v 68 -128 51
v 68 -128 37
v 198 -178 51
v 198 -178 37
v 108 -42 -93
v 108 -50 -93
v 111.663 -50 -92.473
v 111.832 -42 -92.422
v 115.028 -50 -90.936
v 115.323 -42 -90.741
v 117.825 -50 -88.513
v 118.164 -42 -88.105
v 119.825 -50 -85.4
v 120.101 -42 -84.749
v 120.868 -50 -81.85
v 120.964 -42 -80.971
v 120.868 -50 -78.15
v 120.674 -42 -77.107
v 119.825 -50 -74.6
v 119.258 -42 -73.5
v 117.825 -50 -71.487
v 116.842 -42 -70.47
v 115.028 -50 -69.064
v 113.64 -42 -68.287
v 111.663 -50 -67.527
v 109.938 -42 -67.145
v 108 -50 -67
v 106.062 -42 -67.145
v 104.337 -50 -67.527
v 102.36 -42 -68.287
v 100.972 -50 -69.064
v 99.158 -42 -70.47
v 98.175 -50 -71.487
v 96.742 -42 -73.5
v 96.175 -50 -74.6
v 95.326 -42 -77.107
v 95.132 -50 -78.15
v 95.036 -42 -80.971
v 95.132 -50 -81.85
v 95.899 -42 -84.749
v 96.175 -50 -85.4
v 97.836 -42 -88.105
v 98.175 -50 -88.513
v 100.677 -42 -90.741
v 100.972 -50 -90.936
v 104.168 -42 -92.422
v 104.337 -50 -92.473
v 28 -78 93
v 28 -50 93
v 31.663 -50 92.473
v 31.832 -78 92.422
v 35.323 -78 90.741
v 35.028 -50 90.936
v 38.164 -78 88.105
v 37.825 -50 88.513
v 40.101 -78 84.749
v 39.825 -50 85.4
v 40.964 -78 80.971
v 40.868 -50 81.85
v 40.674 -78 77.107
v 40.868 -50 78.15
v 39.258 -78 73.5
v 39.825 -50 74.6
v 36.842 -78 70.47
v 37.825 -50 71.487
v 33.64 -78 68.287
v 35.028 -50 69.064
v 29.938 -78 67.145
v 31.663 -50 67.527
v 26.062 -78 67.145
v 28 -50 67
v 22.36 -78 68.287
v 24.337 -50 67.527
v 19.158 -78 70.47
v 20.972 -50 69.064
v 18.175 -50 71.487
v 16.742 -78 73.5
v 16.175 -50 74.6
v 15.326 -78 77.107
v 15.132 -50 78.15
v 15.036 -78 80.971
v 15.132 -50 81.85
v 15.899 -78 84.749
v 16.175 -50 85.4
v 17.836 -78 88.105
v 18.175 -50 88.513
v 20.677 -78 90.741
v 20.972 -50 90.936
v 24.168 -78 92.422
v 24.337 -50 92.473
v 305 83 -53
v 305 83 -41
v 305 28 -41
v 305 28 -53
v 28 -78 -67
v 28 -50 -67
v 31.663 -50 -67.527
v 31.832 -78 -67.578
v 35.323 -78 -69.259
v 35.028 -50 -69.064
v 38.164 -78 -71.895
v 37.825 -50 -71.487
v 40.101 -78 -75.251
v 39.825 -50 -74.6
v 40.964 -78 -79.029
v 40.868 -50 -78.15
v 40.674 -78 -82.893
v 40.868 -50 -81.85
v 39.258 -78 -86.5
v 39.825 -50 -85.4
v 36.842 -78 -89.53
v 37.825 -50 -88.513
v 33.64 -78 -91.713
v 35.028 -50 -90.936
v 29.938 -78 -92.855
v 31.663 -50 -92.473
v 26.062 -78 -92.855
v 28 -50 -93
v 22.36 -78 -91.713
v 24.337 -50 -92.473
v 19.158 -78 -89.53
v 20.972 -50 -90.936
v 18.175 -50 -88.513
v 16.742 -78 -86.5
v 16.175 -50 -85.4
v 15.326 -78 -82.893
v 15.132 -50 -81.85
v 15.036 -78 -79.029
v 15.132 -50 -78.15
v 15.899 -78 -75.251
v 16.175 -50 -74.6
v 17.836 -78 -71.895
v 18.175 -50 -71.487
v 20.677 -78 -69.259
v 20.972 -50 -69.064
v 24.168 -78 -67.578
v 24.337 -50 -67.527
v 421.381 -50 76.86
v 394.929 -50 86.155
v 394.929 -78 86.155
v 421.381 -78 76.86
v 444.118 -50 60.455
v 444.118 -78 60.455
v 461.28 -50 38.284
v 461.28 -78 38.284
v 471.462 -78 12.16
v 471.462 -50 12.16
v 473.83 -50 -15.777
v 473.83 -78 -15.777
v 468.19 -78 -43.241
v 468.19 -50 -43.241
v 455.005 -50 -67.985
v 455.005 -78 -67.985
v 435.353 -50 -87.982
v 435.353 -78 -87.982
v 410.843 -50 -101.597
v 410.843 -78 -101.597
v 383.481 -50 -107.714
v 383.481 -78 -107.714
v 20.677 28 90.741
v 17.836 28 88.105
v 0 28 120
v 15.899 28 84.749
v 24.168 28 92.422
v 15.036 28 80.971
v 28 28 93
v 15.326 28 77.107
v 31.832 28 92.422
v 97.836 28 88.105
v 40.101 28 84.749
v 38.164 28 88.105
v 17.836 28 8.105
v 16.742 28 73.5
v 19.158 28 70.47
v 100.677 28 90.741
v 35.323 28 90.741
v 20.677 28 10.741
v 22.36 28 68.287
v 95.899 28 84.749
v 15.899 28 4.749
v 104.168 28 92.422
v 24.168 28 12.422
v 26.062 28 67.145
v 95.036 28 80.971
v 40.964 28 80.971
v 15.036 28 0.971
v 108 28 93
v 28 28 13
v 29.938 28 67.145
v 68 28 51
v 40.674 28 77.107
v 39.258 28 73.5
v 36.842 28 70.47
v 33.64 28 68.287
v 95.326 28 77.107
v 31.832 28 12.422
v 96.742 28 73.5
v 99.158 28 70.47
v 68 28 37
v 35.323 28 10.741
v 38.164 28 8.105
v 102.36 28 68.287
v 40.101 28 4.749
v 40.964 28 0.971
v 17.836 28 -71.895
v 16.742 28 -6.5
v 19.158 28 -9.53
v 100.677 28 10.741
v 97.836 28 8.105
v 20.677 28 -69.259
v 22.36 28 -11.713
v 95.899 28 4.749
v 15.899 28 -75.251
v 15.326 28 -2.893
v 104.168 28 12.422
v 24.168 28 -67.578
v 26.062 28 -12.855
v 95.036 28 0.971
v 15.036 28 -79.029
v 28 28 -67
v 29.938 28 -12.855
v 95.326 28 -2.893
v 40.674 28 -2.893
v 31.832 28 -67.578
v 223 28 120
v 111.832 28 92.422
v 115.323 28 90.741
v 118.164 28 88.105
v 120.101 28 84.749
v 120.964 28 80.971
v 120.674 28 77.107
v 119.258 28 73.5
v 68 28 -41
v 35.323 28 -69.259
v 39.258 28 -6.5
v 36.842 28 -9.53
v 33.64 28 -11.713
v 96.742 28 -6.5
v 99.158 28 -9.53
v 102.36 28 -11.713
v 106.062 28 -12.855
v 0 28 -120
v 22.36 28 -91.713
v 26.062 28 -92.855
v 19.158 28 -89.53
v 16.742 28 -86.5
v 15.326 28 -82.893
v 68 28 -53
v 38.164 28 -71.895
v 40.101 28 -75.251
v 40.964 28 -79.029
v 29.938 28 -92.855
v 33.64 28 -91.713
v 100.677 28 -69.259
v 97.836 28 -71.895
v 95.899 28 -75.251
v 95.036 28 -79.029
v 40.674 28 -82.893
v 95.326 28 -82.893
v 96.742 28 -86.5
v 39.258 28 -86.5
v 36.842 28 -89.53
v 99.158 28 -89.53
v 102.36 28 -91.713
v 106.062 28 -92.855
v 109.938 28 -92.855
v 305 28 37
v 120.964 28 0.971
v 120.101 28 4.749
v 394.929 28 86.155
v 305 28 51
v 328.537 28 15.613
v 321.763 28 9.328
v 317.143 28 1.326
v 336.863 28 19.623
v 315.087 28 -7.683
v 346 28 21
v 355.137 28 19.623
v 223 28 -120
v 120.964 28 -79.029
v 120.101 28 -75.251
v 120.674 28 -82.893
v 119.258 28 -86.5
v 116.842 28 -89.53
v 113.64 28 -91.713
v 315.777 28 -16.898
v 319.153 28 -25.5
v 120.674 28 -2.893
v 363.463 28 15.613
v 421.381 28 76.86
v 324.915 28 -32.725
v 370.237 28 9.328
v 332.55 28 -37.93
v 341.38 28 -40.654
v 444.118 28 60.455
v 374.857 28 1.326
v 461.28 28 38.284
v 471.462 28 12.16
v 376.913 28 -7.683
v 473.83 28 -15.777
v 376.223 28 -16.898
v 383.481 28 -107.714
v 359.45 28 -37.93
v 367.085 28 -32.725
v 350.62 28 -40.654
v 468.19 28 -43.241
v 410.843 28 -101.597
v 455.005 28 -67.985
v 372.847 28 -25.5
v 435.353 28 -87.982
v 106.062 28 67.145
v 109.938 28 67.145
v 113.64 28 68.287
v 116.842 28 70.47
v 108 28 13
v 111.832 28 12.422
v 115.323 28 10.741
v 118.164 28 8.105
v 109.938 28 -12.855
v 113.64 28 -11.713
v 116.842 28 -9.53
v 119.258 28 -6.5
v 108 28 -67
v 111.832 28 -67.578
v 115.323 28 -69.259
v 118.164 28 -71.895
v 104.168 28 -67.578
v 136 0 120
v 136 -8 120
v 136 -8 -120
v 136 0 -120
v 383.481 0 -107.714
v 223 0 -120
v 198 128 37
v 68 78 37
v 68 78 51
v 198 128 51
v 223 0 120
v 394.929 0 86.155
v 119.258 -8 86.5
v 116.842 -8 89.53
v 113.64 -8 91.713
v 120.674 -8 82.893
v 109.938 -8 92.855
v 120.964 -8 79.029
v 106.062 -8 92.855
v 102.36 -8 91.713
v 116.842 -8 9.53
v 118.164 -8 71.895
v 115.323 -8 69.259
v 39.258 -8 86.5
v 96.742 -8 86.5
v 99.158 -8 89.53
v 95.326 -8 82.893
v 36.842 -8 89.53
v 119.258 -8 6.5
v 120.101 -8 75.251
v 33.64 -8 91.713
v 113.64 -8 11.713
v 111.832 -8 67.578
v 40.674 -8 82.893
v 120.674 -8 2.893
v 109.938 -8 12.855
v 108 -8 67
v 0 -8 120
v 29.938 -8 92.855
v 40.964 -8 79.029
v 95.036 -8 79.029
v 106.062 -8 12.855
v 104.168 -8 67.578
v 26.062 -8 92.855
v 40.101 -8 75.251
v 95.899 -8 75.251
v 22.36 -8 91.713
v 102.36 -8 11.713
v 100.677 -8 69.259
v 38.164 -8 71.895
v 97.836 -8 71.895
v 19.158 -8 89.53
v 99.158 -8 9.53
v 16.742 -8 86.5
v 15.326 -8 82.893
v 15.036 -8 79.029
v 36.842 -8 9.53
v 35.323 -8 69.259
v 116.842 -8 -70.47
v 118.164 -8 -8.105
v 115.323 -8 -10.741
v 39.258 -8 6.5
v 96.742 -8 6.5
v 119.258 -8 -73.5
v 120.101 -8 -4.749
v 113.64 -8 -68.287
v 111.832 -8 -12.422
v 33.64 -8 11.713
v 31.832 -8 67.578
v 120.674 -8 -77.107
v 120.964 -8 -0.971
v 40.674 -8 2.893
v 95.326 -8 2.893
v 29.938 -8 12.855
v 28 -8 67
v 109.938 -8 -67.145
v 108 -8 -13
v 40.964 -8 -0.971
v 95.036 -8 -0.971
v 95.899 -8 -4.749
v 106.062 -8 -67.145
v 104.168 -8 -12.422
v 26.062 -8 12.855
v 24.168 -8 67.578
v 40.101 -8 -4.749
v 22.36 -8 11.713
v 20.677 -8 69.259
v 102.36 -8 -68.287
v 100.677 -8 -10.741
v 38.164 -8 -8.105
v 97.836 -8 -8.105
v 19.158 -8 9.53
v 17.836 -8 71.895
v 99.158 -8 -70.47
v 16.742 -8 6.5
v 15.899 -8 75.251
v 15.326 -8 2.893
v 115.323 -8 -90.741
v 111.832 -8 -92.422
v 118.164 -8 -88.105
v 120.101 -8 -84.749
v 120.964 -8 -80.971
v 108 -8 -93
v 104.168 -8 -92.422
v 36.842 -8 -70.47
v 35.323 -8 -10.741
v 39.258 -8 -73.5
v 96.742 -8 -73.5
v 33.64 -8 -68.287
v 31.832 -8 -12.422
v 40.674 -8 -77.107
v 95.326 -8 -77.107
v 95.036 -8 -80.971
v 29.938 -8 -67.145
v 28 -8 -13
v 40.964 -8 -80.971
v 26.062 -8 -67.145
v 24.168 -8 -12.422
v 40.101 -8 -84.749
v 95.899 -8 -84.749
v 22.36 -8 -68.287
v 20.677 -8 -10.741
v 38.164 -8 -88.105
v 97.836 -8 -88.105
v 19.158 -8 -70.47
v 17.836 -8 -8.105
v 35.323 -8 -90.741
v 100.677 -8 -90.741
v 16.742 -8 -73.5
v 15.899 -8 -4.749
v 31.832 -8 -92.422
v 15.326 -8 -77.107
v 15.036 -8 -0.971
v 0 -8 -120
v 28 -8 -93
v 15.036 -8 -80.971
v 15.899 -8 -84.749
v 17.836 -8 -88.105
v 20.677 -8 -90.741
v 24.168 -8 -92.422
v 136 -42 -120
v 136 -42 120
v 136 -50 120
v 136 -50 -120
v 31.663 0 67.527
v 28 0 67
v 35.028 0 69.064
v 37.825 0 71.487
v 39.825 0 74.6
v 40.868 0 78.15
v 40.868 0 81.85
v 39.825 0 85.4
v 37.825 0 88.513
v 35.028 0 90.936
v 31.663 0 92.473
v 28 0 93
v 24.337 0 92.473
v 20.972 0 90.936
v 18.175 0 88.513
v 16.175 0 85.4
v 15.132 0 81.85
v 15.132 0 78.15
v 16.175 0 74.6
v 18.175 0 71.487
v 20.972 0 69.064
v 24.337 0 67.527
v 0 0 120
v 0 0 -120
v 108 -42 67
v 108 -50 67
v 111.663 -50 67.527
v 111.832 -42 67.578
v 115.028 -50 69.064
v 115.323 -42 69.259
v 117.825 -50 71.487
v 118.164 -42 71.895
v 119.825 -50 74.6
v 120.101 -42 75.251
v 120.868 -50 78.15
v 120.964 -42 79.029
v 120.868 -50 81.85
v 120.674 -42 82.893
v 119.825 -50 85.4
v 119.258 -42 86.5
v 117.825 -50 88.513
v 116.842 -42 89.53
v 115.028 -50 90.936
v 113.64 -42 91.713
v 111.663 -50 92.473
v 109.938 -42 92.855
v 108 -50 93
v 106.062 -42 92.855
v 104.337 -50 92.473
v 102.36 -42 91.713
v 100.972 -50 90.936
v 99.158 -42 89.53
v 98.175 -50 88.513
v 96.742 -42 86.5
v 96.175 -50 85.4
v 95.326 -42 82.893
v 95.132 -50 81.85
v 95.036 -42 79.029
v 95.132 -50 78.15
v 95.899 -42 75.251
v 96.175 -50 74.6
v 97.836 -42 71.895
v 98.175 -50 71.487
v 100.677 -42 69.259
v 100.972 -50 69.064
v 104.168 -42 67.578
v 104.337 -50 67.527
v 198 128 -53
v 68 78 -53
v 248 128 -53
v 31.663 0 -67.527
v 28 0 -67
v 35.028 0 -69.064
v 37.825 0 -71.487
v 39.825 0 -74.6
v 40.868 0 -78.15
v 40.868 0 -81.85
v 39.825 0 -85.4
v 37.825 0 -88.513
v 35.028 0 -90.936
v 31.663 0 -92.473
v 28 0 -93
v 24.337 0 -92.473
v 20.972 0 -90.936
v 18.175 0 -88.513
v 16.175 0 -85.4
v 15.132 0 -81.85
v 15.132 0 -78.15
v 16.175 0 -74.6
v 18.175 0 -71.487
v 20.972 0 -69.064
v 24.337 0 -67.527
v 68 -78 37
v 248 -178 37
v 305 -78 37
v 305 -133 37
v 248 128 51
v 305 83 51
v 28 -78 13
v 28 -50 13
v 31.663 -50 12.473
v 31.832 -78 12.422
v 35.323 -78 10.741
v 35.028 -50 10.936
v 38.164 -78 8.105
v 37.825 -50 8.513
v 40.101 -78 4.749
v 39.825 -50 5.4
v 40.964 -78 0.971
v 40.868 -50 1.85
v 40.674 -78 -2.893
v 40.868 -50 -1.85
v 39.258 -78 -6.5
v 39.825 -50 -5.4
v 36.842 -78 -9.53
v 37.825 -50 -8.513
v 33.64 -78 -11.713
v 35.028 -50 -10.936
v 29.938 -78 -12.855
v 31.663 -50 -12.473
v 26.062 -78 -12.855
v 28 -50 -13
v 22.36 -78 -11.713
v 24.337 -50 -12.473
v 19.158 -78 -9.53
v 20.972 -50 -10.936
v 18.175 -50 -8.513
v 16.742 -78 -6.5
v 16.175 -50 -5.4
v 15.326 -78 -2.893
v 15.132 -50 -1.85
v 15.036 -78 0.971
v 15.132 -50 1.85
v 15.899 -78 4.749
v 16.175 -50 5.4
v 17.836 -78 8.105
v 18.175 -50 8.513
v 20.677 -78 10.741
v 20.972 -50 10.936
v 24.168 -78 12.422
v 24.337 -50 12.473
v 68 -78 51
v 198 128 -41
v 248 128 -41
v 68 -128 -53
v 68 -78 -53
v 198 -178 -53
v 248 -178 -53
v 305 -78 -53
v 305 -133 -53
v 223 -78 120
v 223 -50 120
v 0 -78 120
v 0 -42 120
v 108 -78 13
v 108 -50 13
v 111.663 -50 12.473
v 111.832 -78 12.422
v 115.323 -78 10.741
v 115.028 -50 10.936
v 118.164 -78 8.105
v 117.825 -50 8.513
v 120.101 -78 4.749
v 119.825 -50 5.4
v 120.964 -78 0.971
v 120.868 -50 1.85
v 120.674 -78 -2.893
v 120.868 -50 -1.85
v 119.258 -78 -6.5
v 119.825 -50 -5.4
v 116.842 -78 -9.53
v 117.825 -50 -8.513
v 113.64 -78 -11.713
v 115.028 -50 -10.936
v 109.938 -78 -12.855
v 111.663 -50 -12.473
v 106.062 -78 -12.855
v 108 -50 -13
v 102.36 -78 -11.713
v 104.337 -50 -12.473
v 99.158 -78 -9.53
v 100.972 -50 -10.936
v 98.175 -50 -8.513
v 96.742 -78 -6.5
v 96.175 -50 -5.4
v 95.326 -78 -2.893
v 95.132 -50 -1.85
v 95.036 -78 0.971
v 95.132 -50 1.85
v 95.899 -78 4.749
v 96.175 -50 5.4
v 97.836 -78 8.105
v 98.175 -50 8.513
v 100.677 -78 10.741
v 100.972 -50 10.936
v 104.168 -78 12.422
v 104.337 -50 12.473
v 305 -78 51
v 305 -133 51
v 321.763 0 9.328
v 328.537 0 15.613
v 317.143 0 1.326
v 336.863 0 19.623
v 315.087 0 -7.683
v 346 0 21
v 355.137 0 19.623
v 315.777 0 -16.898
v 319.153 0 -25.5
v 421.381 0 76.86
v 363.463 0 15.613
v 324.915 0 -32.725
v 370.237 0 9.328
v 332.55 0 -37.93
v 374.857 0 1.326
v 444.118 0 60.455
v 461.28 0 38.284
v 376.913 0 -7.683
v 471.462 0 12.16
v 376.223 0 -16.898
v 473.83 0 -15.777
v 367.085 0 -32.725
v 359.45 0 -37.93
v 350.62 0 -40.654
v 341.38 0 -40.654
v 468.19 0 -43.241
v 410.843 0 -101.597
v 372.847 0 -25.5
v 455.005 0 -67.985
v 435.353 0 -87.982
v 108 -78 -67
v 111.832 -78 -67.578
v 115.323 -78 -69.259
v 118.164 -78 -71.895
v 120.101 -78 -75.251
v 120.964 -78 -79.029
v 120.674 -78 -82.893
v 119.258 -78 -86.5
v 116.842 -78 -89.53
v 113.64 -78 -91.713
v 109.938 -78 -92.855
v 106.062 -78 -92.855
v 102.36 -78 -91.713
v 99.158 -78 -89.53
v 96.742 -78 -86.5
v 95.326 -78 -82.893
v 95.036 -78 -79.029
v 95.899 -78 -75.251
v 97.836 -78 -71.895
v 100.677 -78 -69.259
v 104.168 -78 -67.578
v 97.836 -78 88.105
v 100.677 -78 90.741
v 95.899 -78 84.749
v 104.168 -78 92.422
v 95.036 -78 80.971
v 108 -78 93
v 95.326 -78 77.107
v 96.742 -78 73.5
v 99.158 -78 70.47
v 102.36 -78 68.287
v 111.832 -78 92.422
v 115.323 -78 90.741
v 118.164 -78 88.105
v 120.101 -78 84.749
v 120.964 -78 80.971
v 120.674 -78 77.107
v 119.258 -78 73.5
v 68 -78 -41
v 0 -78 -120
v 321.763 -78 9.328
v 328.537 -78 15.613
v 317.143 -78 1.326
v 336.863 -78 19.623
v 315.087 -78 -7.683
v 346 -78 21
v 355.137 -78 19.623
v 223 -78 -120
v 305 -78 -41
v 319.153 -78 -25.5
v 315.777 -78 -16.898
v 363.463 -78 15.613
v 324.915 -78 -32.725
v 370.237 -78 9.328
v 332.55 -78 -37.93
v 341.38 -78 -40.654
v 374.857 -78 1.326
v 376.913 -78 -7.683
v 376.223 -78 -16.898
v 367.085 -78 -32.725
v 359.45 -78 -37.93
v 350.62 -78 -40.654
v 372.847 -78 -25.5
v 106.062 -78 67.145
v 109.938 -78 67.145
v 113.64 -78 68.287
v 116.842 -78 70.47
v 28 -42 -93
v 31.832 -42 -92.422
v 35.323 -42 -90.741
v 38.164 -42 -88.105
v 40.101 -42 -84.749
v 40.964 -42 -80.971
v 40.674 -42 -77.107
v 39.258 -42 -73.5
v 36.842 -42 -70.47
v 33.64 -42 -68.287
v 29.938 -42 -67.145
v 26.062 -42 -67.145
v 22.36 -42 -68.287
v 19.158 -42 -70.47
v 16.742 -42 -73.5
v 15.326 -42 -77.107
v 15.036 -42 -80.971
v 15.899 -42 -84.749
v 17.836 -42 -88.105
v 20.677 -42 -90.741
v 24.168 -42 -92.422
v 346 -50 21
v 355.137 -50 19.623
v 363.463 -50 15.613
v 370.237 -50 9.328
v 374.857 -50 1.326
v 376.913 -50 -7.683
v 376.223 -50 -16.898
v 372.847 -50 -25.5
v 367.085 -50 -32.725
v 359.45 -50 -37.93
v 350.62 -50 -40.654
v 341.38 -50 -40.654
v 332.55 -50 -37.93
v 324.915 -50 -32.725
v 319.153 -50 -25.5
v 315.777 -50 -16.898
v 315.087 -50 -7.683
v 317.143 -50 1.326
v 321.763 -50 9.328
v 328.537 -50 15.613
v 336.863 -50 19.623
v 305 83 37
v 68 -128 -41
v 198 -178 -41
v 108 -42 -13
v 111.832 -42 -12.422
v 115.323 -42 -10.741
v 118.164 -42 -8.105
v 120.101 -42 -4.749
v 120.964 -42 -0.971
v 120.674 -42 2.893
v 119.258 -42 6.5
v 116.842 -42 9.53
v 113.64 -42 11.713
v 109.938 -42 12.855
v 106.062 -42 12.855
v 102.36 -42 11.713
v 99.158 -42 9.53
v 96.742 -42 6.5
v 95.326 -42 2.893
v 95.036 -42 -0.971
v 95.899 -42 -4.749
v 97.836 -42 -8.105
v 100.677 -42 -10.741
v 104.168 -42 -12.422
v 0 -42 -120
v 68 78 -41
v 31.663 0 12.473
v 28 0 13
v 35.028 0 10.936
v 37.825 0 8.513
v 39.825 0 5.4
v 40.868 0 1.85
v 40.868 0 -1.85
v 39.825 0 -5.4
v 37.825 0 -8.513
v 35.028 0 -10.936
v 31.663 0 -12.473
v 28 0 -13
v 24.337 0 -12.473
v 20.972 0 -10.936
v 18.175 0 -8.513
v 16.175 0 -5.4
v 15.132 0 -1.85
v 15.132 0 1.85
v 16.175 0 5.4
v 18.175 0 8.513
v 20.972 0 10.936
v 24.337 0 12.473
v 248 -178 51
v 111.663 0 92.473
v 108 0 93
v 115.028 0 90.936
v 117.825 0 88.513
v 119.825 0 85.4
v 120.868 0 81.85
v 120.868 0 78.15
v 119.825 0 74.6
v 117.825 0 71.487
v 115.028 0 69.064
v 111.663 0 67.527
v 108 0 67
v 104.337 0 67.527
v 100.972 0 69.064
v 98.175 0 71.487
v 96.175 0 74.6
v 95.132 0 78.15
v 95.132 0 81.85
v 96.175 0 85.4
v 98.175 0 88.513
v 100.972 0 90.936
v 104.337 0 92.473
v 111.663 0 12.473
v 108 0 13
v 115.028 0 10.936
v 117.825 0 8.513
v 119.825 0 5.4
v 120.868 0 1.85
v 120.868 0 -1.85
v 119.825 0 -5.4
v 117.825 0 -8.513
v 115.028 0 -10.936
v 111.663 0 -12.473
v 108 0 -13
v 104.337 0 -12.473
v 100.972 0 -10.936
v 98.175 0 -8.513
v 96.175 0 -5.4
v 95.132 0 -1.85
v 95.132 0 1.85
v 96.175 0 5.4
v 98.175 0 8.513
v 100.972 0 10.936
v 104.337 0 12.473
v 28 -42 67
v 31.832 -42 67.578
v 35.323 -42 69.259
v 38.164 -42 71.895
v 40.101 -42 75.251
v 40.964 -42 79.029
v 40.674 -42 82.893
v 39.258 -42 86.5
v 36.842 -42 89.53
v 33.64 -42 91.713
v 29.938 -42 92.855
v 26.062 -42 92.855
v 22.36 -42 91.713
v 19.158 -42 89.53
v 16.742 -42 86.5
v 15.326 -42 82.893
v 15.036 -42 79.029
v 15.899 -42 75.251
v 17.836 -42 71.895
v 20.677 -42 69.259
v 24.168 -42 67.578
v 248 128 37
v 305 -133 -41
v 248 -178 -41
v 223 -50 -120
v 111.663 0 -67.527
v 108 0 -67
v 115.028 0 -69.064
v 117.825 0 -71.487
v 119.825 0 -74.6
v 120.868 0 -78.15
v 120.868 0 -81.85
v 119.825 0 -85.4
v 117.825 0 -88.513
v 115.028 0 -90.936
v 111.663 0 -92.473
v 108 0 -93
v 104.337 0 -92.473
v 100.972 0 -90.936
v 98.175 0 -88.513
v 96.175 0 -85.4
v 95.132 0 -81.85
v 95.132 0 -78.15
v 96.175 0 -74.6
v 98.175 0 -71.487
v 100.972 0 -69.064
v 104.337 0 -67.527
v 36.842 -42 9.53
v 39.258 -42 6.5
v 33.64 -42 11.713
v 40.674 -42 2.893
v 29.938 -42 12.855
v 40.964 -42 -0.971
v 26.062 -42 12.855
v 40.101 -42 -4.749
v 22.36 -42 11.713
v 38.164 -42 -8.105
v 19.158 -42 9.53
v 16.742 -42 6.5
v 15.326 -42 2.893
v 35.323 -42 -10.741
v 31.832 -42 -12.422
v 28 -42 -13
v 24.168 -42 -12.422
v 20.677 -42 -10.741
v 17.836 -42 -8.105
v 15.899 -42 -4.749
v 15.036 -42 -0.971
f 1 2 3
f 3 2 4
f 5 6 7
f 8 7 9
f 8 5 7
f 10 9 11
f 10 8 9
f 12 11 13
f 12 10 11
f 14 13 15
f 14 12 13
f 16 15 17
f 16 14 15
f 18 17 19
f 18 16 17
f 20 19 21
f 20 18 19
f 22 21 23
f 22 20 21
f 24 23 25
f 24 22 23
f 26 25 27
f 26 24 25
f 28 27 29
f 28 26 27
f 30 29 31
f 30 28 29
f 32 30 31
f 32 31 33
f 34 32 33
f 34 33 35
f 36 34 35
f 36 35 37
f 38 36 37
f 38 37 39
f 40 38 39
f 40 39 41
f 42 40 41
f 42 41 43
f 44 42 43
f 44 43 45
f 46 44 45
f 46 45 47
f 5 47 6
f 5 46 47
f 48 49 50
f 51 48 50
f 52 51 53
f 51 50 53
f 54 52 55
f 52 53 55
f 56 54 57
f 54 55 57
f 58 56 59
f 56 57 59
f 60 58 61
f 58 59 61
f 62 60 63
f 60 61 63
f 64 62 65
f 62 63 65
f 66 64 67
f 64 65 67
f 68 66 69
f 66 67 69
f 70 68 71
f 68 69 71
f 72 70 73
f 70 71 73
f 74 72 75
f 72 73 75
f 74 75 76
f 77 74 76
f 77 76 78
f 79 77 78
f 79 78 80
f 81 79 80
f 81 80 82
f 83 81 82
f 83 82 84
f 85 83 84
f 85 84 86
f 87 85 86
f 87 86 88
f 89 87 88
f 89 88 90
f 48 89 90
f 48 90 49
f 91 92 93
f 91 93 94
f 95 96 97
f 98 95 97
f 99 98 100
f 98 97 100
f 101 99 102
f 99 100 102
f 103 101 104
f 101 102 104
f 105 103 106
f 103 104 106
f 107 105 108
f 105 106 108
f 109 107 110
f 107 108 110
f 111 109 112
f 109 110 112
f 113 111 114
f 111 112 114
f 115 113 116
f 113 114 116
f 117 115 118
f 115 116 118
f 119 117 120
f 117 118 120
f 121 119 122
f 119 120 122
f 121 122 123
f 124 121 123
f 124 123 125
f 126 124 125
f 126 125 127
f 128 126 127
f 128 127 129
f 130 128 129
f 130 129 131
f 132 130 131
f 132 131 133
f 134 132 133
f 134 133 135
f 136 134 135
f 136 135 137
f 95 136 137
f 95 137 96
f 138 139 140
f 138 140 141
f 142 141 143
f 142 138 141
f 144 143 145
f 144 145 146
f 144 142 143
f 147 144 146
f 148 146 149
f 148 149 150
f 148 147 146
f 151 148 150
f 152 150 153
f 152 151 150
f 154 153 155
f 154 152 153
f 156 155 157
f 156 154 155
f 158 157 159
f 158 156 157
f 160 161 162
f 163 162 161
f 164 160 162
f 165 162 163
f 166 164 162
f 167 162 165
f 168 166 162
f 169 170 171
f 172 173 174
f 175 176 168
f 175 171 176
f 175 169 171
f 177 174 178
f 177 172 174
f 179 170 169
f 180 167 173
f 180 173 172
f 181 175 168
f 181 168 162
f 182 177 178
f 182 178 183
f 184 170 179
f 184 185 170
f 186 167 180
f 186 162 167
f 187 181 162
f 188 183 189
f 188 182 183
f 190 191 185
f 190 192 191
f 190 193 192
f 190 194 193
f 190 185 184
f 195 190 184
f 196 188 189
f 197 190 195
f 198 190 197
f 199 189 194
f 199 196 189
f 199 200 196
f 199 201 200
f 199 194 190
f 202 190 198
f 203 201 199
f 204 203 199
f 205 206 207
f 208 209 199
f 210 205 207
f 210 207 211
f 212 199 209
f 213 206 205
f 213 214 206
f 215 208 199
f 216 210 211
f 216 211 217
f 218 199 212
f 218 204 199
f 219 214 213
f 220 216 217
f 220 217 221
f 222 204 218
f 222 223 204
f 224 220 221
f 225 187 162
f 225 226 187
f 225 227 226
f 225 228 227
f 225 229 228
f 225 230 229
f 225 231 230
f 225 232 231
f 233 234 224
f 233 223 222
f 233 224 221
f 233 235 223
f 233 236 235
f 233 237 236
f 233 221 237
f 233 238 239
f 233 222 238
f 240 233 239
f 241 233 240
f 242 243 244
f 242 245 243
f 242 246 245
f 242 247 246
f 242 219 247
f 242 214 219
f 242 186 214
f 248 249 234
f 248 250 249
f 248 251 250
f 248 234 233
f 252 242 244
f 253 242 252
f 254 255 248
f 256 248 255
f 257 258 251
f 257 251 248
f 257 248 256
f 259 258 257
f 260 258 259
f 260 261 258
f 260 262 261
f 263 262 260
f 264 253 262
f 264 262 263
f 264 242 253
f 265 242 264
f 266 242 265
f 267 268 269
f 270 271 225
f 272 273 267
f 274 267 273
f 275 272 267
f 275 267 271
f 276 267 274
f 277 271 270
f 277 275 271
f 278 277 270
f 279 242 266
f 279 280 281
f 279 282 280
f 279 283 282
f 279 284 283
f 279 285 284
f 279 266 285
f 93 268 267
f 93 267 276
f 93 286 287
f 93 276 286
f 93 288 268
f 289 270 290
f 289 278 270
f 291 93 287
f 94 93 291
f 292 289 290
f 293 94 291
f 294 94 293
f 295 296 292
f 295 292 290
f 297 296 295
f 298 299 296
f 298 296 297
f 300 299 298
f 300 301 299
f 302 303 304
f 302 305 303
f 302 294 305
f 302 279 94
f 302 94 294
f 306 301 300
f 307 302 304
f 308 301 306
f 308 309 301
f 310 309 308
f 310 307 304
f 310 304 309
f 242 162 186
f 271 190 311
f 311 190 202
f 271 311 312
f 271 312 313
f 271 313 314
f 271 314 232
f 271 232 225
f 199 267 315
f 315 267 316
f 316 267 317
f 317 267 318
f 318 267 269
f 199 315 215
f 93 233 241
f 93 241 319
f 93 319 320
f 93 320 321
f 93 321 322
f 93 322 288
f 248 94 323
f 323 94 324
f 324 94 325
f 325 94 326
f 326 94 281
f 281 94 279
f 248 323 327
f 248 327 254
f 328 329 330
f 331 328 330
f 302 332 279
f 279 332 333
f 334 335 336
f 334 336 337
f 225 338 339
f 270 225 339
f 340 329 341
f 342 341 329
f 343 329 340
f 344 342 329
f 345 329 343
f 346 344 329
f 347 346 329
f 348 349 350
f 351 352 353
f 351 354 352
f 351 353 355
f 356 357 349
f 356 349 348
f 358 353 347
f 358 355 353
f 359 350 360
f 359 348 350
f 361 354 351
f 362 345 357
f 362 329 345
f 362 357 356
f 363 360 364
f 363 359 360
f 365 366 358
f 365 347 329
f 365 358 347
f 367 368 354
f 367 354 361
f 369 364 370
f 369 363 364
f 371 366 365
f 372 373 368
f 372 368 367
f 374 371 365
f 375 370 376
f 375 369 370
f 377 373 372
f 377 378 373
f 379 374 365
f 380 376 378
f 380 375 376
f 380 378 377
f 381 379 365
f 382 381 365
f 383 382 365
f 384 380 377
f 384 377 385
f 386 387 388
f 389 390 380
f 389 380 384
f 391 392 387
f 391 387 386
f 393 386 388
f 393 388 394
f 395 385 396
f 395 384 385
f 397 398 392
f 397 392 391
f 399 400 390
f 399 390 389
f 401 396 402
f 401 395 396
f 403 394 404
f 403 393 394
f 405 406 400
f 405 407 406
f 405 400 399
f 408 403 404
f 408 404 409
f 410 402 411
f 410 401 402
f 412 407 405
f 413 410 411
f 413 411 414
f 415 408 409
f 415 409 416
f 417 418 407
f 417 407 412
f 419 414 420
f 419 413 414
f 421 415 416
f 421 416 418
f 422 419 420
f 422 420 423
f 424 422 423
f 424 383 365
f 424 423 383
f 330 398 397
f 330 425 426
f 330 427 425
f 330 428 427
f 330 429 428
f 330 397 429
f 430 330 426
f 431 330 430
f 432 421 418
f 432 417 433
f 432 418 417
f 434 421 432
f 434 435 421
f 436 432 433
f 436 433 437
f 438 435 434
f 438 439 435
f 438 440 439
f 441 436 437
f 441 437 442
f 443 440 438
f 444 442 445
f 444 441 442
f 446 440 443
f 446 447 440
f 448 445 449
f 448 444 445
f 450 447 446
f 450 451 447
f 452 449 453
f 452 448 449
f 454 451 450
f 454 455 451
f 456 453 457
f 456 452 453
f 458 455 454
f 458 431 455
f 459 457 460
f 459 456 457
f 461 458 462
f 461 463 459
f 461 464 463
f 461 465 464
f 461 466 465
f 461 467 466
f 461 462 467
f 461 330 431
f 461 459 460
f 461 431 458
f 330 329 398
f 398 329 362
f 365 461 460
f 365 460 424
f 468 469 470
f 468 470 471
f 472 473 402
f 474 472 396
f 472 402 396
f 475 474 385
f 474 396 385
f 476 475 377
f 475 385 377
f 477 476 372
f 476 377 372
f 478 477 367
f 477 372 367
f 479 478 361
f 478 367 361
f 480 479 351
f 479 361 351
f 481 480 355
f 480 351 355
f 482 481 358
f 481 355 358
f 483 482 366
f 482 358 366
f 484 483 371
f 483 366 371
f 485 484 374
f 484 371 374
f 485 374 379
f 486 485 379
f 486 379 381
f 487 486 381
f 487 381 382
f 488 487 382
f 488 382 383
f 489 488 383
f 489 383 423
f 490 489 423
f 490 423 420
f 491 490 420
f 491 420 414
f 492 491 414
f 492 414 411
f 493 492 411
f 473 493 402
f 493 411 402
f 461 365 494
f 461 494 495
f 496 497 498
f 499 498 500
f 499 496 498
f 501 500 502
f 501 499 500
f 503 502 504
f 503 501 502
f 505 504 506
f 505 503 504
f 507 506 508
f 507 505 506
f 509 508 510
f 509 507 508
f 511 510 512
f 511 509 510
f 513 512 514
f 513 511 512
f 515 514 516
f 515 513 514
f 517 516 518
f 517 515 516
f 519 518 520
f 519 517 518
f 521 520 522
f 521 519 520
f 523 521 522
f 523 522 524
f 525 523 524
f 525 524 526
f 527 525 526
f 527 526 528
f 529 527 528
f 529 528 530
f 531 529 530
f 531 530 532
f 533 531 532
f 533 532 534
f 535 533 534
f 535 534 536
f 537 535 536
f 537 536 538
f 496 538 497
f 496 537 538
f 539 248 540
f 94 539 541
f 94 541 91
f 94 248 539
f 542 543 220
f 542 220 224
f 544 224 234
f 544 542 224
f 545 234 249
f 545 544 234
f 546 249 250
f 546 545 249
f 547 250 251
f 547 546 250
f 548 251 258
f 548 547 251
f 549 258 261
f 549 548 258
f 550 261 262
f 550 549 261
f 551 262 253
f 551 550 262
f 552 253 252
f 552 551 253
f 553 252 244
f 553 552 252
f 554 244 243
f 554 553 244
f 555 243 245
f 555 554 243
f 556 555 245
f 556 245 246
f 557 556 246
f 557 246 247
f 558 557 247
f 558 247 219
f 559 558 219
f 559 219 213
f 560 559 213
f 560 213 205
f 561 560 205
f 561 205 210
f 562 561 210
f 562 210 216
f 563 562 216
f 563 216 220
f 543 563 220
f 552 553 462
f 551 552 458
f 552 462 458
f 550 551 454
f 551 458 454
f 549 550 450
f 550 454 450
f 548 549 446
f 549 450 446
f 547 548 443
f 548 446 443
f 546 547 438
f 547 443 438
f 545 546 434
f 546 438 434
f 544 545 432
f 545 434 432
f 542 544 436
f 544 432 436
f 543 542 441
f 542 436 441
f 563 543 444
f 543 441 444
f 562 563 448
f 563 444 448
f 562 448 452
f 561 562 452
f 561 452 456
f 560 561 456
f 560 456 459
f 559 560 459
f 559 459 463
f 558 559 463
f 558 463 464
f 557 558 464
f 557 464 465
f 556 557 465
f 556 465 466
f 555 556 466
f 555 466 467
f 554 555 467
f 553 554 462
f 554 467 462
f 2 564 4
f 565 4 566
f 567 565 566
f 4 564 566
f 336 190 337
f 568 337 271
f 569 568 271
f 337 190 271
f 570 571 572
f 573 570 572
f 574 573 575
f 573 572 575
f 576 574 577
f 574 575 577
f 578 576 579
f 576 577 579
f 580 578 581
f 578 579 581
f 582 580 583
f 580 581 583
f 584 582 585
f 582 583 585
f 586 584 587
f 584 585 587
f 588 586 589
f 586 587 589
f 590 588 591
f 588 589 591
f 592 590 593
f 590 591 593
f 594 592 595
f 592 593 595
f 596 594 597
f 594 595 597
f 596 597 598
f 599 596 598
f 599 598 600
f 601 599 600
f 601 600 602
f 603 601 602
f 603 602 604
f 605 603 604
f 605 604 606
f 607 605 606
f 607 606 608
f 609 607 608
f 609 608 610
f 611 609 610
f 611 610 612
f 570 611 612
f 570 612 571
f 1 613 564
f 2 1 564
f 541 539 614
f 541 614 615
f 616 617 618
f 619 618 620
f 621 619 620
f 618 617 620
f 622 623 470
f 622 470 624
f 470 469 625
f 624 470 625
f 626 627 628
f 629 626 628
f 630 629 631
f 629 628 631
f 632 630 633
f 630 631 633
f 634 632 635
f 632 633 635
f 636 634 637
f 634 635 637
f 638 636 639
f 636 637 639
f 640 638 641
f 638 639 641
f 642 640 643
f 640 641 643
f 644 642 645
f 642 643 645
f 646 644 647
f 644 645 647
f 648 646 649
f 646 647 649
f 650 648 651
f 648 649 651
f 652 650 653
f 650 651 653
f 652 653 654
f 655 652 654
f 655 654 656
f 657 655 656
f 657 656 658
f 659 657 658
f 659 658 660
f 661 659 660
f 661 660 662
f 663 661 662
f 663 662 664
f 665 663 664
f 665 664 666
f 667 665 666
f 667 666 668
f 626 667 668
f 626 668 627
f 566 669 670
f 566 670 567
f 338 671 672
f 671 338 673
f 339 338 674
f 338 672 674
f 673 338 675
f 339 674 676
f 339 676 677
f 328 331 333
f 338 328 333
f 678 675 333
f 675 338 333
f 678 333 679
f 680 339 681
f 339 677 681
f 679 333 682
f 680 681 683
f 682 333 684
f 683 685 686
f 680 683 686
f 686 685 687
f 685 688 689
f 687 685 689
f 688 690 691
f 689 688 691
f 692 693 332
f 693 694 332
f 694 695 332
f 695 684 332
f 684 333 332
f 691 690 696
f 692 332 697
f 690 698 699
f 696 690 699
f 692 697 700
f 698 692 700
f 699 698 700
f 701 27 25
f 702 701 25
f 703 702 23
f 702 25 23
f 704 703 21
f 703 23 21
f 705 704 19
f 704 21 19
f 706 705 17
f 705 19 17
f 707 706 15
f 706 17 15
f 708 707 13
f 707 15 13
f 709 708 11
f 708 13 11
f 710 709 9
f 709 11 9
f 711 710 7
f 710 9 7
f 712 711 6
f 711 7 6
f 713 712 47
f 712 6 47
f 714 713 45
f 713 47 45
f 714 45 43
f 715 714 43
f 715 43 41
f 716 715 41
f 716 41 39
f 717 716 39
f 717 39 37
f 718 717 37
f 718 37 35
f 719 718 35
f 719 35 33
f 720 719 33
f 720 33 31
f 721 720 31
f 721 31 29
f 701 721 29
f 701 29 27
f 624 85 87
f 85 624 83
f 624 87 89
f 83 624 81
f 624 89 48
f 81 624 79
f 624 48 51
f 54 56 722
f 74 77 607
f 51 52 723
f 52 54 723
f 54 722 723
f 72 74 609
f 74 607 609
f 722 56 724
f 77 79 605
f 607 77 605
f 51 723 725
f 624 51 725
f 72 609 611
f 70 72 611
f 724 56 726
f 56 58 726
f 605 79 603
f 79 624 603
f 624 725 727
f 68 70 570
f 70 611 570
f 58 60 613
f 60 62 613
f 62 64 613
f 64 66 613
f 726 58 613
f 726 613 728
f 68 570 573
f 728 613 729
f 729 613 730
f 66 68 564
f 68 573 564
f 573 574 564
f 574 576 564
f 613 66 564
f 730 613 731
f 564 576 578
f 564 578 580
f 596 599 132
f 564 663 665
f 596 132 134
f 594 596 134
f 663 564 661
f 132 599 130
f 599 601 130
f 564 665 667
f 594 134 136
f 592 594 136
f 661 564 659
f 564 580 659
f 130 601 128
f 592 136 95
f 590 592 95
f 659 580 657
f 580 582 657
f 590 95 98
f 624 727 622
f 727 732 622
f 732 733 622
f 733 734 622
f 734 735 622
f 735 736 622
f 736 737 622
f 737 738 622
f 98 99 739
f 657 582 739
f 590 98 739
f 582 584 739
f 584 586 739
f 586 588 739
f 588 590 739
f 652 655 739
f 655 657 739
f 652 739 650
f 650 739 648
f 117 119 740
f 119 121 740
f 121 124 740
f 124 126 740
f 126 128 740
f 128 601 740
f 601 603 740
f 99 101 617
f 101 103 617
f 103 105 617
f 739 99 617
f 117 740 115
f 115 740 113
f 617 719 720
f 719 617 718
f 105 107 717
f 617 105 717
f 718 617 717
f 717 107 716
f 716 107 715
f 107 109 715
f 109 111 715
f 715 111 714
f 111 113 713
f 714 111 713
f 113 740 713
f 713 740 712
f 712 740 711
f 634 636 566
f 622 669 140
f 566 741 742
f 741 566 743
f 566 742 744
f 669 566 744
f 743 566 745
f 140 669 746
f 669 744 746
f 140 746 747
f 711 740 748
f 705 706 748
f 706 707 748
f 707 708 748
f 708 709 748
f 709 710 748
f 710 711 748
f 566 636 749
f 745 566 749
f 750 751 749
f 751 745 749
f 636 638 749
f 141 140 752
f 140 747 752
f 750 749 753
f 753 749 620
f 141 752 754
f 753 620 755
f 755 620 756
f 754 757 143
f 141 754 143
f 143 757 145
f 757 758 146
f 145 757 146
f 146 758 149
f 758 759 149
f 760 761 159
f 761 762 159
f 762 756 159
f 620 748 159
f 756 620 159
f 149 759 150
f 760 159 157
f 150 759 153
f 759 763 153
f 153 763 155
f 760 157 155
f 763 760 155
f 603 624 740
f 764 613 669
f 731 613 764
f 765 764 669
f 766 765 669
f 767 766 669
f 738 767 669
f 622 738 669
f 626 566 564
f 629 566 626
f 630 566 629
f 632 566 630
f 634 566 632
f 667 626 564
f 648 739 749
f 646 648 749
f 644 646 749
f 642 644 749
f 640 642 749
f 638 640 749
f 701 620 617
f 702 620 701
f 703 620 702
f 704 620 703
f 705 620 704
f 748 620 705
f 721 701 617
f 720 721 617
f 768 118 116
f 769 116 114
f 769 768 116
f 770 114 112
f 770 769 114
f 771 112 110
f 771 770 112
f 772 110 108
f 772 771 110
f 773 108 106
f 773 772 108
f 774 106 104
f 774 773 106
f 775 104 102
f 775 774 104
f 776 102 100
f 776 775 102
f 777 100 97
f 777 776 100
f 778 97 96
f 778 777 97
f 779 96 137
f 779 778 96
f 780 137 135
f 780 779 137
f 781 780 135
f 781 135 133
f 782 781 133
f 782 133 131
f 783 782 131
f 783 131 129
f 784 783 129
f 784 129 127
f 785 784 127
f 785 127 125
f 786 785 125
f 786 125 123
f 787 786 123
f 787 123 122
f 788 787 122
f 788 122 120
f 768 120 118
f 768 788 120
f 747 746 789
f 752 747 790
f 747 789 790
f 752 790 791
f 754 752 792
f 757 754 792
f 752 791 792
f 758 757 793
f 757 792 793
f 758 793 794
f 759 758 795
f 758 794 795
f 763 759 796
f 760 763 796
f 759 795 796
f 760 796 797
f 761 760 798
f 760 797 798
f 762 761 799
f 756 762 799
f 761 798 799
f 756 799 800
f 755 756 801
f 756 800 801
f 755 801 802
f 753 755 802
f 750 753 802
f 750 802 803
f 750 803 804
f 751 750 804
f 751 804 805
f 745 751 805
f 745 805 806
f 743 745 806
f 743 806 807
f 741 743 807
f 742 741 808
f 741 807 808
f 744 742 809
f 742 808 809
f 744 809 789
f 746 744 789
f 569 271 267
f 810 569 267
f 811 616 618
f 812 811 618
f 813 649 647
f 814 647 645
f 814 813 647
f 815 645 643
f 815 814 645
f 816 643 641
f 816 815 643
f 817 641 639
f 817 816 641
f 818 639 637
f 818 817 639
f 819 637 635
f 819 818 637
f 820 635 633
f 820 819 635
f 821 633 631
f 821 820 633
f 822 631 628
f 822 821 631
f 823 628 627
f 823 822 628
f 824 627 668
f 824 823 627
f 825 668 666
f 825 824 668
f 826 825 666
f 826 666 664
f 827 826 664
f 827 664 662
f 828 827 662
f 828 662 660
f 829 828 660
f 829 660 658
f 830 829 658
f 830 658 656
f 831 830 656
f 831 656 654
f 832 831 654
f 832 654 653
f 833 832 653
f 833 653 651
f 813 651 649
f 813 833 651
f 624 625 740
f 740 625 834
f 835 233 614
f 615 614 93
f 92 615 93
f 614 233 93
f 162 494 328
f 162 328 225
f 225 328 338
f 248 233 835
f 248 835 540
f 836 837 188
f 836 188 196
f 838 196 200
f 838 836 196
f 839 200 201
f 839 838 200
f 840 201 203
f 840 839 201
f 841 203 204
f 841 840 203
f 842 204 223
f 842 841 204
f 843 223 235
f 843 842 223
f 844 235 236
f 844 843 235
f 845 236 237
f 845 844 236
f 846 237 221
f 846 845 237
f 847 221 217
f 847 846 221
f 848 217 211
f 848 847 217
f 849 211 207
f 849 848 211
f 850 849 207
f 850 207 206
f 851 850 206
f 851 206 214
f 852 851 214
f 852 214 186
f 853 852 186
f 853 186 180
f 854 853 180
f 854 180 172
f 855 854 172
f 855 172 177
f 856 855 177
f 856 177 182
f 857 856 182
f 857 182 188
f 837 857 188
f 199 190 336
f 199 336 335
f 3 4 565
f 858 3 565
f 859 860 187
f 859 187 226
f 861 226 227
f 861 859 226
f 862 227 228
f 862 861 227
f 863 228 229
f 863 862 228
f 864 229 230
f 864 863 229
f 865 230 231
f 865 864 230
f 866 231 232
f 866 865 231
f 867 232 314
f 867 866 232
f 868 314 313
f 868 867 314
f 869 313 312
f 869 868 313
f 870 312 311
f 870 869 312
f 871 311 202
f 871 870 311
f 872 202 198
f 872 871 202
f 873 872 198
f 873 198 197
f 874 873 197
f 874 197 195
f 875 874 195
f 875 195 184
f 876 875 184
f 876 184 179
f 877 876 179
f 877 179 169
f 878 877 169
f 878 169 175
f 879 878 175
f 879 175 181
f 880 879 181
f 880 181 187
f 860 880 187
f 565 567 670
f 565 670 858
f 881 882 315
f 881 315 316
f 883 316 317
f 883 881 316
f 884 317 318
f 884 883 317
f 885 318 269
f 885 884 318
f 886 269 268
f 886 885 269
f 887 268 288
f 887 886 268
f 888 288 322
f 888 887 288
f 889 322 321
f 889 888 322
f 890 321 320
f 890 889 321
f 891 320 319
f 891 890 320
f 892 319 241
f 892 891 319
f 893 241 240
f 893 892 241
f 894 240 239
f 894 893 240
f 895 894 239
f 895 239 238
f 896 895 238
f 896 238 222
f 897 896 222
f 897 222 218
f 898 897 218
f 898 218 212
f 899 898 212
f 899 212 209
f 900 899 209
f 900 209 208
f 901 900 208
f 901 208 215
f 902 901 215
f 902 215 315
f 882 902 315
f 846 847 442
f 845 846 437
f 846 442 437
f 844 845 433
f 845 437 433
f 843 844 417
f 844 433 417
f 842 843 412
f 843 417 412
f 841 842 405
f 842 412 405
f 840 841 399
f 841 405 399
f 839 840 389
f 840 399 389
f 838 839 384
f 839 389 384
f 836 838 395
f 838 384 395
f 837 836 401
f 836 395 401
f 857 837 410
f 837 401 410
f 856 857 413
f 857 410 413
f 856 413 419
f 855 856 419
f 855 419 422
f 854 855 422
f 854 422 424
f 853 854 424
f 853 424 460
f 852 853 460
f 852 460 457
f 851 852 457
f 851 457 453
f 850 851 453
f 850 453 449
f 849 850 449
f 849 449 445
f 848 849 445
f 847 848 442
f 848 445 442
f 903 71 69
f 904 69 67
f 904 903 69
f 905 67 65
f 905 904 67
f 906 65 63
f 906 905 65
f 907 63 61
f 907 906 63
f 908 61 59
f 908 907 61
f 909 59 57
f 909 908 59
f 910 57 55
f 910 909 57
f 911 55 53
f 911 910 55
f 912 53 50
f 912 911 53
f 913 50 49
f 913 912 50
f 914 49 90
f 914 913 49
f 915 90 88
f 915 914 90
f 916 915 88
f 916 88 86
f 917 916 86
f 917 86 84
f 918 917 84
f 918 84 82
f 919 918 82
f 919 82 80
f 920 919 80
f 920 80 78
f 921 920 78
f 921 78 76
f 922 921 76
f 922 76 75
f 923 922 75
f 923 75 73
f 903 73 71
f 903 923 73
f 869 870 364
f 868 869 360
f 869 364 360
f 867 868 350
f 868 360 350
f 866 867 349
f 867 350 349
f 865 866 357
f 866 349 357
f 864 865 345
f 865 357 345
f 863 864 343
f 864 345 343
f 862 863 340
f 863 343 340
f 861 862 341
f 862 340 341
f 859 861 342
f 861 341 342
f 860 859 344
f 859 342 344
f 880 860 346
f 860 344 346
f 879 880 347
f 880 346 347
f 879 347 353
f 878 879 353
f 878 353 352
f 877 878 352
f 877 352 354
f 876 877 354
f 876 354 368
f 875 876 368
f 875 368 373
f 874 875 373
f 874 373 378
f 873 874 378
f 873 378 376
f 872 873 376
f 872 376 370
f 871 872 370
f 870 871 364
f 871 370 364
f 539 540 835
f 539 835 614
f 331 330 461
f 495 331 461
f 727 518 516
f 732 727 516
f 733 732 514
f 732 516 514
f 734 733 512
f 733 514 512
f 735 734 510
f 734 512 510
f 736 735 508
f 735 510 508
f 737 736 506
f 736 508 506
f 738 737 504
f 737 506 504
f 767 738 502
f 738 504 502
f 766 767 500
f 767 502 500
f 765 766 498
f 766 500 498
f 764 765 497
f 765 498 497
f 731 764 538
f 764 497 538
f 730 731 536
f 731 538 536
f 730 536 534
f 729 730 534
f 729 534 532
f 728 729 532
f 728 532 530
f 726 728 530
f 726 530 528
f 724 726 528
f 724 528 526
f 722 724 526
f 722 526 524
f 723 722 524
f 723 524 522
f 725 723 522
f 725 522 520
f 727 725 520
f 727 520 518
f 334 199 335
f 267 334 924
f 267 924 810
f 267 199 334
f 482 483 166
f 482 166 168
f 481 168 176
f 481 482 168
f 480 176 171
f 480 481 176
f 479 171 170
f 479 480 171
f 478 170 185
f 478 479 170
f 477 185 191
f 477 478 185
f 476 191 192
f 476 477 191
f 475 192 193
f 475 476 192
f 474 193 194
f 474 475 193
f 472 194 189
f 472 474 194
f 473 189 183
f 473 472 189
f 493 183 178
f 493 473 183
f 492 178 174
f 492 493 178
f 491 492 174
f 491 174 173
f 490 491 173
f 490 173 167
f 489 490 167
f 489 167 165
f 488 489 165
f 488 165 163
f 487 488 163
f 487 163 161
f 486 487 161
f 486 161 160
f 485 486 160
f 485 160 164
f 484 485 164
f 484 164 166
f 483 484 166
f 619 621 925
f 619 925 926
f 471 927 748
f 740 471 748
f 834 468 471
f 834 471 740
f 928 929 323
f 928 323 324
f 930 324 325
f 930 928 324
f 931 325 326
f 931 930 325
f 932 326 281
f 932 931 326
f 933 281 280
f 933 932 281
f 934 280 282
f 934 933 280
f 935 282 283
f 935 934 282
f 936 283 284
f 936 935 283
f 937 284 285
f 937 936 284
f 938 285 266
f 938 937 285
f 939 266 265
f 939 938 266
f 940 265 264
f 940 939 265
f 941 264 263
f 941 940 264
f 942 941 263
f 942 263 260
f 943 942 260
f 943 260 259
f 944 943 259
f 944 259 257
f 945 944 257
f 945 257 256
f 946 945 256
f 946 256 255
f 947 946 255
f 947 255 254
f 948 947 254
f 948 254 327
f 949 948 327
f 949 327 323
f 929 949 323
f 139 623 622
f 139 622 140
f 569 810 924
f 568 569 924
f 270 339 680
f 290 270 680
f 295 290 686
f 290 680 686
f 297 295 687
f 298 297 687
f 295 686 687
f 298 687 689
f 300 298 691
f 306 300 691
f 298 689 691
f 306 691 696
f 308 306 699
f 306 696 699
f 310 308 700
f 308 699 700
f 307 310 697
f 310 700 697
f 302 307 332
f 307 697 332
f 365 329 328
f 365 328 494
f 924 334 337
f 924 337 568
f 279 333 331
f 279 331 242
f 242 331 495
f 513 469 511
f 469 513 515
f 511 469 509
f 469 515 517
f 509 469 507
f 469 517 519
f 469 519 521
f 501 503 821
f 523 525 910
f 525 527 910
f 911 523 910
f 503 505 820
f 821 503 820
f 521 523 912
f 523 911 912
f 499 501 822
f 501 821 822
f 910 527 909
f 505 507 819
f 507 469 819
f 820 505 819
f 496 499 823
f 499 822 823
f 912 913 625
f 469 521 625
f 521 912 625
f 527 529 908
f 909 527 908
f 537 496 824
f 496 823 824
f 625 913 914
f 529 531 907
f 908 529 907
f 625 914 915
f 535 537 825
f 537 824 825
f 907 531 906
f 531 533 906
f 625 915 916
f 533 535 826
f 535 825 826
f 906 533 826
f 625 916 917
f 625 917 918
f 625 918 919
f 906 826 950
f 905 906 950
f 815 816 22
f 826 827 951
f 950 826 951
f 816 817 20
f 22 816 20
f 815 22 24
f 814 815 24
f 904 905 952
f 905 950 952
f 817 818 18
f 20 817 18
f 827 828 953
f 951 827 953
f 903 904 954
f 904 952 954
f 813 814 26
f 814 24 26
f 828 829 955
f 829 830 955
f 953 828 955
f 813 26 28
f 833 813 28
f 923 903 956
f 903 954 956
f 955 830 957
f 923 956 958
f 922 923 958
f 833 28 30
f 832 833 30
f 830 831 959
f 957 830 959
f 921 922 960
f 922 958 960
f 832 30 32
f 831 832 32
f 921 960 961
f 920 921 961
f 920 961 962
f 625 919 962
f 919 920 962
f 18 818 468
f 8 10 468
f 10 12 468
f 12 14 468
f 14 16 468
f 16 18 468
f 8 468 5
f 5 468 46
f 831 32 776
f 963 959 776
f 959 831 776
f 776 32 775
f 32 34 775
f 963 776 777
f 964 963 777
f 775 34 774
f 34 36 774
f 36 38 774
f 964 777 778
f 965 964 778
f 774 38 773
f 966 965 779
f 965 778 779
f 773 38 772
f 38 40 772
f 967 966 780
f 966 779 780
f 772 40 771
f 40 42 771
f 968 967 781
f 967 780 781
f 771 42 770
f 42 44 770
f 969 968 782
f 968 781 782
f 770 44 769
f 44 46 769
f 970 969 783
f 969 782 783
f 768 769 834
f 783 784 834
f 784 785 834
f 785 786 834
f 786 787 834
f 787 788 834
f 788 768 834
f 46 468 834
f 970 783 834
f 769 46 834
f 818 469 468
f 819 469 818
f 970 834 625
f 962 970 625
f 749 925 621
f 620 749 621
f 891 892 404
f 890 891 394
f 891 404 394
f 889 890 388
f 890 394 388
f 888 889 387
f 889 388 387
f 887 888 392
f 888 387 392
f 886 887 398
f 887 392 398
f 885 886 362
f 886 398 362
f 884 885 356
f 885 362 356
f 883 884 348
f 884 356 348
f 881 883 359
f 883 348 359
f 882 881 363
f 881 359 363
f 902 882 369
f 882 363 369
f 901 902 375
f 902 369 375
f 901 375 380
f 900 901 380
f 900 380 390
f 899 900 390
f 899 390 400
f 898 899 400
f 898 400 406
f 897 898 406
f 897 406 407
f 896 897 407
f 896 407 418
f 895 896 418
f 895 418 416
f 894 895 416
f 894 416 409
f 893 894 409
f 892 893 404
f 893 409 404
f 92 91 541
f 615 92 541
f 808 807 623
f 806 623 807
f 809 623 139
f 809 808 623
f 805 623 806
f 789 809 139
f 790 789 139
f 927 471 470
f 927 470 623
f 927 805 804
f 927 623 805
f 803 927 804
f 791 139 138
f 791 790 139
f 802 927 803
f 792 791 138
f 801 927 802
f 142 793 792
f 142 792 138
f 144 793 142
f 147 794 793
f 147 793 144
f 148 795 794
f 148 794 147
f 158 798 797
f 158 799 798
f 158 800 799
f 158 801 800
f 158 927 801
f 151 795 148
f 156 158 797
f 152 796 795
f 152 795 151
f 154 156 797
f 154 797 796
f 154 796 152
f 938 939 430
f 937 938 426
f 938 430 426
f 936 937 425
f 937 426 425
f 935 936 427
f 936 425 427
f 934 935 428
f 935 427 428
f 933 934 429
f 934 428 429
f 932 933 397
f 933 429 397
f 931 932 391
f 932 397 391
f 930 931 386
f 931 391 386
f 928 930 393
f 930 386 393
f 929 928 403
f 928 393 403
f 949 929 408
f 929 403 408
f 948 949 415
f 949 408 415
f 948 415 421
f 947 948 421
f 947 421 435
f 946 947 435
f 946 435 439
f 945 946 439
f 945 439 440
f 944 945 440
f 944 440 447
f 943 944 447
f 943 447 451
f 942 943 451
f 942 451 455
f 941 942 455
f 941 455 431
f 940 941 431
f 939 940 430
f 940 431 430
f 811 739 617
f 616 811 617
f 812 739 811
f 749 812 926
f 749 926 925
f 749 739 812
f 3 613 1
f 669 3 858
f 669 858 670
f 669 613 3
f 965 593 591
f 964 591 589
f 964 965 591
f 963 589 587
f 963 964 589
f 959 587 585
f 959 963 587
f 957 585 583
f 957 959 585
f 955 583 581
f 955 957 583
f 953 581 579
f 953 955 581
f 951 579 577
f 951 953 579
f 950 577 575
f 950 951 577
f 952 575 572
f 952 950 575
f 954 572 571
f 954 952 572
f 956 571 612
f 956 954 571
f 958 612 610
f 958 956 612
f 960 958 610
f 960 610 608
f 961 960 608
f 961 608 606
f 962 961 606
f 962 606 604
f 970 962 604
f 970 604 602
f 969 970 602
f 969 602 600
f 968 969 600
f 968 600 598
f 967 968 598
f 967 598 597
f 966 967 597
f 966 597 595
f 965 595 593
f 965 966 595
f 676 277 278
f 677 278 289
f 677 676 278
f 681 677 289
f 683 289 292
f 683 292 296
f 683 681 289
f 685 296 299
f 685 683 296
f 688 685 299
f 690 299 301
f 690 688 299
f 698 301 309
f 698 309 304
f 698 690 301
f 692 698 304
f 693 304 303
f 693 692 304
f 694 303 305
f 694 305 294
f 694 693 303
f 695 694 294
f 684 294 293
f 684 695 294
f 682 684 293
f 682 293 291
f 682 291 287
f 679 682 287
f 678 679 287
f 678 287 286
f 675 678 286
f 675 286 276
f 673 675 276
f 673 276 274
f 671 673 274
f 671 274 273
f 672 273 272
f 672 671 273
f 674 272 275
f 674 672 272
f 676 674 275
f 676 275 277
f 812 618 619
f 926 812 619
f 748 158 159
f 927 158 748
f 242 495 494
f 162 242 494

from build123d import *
from build123d.topology import SkipClean

# Parameters (mm, degrees)
SKETCH_1_R          = 31
SKETCH_1_R_2        = 13
EXTRUDE_1_DEPTH     = 28
SKETCH_2_W          = 237
SKETCH_2_H          = 12
SKETCH_2_H_2        = 14
EXTRUDE_2_DEPTH     = 100
CUT_EXTRUDE_1_DEPTH = 521.566038078
EXTRUDE_START       = 8
SKETCH_4_W          = 136
SKETCH_4_H          = 240
SKETCH_4_R          = 13
EXTRUDE_3_DEPTH     = 8


with BuildPart() as part:
    # 草图1 → 凸台-拉伸1 (new body)
    with BuildSketch(Plane(origin=(0, 0, 0), x_dir=(1, 0, 0), z_dir=(0, 1, 0))):
        with BuildLine():
            Line((0, 120), (0, -120))
            Line((0, -120), (223, -120))
            Line((223, -120), (394.928728095, -86.154579988))
            ThreePointArc((394.928728095, -86.154579988), (473.829584875, 15.776878329), (383.480702502, 107.714068025))
            Line((383.480702502, 107.714068025), (223, 120))
            Line((223, 120), (0, 120))
        make_face()
        with Locations(Location((346, 10, 0), (0, 0, 270))):
            Circle(SKETCH_1_R, mode=Mode.SUBTRACT)
        with Locations(Location((28, 80, 0), (0, 0, 270))):
            Circle(SKETCH_1_R_2, mode=Mode.SUBTRACT)
        with Locations(Location((28, 0, 0), (0, 0, 270))):
            Circle(SKETCH_1_R_2, mode=Mode.SUBTRACT)
        with Locations(Location((28, -80, 0), (0, 0, 270))):
            Circle(SKETCH_1_R_2, mode=Mode.SUBTRACT)
        with Locations(Location((108, 80, 0), (0, 0, 270))):
            Circle(SKETCH_1_R_2, mode=Mode.SUBTRACT)
        with Locations(Location((108, 0, 0), (0, 0, 270))):
            Circle(SKETCH_1_R_2, mode=Mode.SUBTRACT)
        with Locations(Location((108, -80, 0), (0, 0, 270))):
            Circle(SKETCH_1_R_2, mode=Mode.SUBTRACT)
    extrude(amount=EXTRUDE_1_DEPTH)

    # 草图2 → 凸台-拉伸2 (add)
    with BuildSketch(Plane(origin=(0, 28, 0), x_dir=(1, 0, 0), z_dir=(0, 1, 0))):
        with Locations((186.5, 47)):
            Rectangle(SKETCH_2_W, SKETCH_2_H)
        with Locations((186.5, -44)):
            Rectangle(SKETCH_2_W, SKETCH_2_H_2)
    extrude(amount=EXTRUDE_2_DEPTH)

    # 草图3 → 切除-拉伸1 (cut, through all)
    with BuildSketch(Plane(origin=(0, 0, -53), x_dir=(1, 0, 0), z_dir=(0, 0, -1))):
        Polygon((305, -128), (305, -83), (248, -128), align=None)
        Polygon((68, -128), (68, -78), (198, -128), align=None)
    extrude(amount=-CUT_EXTRUDE_1_DEPTH, mode=Mode.SUBTRACT)

    # 草图4 → 凸台-拉伸3 (add)
    with SkipClean():  # the faces are left unmerged after this step: merging them gives an invalid solid
        with BuildSketch(Plane(origin=(0, 0, 0), x_dir=(-1, 0, 0), z_dir=(0, -1, 0)).offset(EXTRUDE_START)):
            with Locations((-68, 0)):
                Rectangle(SKETCH_4_W, SKETCH_4_H)
            with Locations(Location((-28, -80, 0), (0, 0, 90))):
                Circle(SKETCH_4_R, mode=Mode.SUBTRACT)
            with Locations(Location((-108, -80, 0), (0, 0, 90))):
                Circle(SKETCH_4_R, mode=Mode.SUBTRACT)
            with Locations(Location((-28, 0, 0), (0, 0, 90))):
                Circle(SKETCH_4_R, mode=Mode.SUBTRACT)
            with Locations(Location((-108, 0, 0), (0, 0, 90))):
                Circle(SKETCH_4_R, mode=Mode.SUBTRACT)
            with Locations(Location((-28, 80, 0), (0, 0, 90))):
                Circle(SKETCH_4_R, mode=Mode.SUBTRACT)
            with Locations(Location((-108, 80, 0), (0, 0, 90))):
                Circle(SKETCH_4_R, mode=Mode.SUBTRACT)
        extrude(amount=-EXTRUDE_3_DEPTH)


with BuildPart() as body_2:
    # 镜向1: mirrored copy
    add(part.part.mirror(Plane.ZX.offset(-25)))


solid = Compound([part.part, body_2.part])
